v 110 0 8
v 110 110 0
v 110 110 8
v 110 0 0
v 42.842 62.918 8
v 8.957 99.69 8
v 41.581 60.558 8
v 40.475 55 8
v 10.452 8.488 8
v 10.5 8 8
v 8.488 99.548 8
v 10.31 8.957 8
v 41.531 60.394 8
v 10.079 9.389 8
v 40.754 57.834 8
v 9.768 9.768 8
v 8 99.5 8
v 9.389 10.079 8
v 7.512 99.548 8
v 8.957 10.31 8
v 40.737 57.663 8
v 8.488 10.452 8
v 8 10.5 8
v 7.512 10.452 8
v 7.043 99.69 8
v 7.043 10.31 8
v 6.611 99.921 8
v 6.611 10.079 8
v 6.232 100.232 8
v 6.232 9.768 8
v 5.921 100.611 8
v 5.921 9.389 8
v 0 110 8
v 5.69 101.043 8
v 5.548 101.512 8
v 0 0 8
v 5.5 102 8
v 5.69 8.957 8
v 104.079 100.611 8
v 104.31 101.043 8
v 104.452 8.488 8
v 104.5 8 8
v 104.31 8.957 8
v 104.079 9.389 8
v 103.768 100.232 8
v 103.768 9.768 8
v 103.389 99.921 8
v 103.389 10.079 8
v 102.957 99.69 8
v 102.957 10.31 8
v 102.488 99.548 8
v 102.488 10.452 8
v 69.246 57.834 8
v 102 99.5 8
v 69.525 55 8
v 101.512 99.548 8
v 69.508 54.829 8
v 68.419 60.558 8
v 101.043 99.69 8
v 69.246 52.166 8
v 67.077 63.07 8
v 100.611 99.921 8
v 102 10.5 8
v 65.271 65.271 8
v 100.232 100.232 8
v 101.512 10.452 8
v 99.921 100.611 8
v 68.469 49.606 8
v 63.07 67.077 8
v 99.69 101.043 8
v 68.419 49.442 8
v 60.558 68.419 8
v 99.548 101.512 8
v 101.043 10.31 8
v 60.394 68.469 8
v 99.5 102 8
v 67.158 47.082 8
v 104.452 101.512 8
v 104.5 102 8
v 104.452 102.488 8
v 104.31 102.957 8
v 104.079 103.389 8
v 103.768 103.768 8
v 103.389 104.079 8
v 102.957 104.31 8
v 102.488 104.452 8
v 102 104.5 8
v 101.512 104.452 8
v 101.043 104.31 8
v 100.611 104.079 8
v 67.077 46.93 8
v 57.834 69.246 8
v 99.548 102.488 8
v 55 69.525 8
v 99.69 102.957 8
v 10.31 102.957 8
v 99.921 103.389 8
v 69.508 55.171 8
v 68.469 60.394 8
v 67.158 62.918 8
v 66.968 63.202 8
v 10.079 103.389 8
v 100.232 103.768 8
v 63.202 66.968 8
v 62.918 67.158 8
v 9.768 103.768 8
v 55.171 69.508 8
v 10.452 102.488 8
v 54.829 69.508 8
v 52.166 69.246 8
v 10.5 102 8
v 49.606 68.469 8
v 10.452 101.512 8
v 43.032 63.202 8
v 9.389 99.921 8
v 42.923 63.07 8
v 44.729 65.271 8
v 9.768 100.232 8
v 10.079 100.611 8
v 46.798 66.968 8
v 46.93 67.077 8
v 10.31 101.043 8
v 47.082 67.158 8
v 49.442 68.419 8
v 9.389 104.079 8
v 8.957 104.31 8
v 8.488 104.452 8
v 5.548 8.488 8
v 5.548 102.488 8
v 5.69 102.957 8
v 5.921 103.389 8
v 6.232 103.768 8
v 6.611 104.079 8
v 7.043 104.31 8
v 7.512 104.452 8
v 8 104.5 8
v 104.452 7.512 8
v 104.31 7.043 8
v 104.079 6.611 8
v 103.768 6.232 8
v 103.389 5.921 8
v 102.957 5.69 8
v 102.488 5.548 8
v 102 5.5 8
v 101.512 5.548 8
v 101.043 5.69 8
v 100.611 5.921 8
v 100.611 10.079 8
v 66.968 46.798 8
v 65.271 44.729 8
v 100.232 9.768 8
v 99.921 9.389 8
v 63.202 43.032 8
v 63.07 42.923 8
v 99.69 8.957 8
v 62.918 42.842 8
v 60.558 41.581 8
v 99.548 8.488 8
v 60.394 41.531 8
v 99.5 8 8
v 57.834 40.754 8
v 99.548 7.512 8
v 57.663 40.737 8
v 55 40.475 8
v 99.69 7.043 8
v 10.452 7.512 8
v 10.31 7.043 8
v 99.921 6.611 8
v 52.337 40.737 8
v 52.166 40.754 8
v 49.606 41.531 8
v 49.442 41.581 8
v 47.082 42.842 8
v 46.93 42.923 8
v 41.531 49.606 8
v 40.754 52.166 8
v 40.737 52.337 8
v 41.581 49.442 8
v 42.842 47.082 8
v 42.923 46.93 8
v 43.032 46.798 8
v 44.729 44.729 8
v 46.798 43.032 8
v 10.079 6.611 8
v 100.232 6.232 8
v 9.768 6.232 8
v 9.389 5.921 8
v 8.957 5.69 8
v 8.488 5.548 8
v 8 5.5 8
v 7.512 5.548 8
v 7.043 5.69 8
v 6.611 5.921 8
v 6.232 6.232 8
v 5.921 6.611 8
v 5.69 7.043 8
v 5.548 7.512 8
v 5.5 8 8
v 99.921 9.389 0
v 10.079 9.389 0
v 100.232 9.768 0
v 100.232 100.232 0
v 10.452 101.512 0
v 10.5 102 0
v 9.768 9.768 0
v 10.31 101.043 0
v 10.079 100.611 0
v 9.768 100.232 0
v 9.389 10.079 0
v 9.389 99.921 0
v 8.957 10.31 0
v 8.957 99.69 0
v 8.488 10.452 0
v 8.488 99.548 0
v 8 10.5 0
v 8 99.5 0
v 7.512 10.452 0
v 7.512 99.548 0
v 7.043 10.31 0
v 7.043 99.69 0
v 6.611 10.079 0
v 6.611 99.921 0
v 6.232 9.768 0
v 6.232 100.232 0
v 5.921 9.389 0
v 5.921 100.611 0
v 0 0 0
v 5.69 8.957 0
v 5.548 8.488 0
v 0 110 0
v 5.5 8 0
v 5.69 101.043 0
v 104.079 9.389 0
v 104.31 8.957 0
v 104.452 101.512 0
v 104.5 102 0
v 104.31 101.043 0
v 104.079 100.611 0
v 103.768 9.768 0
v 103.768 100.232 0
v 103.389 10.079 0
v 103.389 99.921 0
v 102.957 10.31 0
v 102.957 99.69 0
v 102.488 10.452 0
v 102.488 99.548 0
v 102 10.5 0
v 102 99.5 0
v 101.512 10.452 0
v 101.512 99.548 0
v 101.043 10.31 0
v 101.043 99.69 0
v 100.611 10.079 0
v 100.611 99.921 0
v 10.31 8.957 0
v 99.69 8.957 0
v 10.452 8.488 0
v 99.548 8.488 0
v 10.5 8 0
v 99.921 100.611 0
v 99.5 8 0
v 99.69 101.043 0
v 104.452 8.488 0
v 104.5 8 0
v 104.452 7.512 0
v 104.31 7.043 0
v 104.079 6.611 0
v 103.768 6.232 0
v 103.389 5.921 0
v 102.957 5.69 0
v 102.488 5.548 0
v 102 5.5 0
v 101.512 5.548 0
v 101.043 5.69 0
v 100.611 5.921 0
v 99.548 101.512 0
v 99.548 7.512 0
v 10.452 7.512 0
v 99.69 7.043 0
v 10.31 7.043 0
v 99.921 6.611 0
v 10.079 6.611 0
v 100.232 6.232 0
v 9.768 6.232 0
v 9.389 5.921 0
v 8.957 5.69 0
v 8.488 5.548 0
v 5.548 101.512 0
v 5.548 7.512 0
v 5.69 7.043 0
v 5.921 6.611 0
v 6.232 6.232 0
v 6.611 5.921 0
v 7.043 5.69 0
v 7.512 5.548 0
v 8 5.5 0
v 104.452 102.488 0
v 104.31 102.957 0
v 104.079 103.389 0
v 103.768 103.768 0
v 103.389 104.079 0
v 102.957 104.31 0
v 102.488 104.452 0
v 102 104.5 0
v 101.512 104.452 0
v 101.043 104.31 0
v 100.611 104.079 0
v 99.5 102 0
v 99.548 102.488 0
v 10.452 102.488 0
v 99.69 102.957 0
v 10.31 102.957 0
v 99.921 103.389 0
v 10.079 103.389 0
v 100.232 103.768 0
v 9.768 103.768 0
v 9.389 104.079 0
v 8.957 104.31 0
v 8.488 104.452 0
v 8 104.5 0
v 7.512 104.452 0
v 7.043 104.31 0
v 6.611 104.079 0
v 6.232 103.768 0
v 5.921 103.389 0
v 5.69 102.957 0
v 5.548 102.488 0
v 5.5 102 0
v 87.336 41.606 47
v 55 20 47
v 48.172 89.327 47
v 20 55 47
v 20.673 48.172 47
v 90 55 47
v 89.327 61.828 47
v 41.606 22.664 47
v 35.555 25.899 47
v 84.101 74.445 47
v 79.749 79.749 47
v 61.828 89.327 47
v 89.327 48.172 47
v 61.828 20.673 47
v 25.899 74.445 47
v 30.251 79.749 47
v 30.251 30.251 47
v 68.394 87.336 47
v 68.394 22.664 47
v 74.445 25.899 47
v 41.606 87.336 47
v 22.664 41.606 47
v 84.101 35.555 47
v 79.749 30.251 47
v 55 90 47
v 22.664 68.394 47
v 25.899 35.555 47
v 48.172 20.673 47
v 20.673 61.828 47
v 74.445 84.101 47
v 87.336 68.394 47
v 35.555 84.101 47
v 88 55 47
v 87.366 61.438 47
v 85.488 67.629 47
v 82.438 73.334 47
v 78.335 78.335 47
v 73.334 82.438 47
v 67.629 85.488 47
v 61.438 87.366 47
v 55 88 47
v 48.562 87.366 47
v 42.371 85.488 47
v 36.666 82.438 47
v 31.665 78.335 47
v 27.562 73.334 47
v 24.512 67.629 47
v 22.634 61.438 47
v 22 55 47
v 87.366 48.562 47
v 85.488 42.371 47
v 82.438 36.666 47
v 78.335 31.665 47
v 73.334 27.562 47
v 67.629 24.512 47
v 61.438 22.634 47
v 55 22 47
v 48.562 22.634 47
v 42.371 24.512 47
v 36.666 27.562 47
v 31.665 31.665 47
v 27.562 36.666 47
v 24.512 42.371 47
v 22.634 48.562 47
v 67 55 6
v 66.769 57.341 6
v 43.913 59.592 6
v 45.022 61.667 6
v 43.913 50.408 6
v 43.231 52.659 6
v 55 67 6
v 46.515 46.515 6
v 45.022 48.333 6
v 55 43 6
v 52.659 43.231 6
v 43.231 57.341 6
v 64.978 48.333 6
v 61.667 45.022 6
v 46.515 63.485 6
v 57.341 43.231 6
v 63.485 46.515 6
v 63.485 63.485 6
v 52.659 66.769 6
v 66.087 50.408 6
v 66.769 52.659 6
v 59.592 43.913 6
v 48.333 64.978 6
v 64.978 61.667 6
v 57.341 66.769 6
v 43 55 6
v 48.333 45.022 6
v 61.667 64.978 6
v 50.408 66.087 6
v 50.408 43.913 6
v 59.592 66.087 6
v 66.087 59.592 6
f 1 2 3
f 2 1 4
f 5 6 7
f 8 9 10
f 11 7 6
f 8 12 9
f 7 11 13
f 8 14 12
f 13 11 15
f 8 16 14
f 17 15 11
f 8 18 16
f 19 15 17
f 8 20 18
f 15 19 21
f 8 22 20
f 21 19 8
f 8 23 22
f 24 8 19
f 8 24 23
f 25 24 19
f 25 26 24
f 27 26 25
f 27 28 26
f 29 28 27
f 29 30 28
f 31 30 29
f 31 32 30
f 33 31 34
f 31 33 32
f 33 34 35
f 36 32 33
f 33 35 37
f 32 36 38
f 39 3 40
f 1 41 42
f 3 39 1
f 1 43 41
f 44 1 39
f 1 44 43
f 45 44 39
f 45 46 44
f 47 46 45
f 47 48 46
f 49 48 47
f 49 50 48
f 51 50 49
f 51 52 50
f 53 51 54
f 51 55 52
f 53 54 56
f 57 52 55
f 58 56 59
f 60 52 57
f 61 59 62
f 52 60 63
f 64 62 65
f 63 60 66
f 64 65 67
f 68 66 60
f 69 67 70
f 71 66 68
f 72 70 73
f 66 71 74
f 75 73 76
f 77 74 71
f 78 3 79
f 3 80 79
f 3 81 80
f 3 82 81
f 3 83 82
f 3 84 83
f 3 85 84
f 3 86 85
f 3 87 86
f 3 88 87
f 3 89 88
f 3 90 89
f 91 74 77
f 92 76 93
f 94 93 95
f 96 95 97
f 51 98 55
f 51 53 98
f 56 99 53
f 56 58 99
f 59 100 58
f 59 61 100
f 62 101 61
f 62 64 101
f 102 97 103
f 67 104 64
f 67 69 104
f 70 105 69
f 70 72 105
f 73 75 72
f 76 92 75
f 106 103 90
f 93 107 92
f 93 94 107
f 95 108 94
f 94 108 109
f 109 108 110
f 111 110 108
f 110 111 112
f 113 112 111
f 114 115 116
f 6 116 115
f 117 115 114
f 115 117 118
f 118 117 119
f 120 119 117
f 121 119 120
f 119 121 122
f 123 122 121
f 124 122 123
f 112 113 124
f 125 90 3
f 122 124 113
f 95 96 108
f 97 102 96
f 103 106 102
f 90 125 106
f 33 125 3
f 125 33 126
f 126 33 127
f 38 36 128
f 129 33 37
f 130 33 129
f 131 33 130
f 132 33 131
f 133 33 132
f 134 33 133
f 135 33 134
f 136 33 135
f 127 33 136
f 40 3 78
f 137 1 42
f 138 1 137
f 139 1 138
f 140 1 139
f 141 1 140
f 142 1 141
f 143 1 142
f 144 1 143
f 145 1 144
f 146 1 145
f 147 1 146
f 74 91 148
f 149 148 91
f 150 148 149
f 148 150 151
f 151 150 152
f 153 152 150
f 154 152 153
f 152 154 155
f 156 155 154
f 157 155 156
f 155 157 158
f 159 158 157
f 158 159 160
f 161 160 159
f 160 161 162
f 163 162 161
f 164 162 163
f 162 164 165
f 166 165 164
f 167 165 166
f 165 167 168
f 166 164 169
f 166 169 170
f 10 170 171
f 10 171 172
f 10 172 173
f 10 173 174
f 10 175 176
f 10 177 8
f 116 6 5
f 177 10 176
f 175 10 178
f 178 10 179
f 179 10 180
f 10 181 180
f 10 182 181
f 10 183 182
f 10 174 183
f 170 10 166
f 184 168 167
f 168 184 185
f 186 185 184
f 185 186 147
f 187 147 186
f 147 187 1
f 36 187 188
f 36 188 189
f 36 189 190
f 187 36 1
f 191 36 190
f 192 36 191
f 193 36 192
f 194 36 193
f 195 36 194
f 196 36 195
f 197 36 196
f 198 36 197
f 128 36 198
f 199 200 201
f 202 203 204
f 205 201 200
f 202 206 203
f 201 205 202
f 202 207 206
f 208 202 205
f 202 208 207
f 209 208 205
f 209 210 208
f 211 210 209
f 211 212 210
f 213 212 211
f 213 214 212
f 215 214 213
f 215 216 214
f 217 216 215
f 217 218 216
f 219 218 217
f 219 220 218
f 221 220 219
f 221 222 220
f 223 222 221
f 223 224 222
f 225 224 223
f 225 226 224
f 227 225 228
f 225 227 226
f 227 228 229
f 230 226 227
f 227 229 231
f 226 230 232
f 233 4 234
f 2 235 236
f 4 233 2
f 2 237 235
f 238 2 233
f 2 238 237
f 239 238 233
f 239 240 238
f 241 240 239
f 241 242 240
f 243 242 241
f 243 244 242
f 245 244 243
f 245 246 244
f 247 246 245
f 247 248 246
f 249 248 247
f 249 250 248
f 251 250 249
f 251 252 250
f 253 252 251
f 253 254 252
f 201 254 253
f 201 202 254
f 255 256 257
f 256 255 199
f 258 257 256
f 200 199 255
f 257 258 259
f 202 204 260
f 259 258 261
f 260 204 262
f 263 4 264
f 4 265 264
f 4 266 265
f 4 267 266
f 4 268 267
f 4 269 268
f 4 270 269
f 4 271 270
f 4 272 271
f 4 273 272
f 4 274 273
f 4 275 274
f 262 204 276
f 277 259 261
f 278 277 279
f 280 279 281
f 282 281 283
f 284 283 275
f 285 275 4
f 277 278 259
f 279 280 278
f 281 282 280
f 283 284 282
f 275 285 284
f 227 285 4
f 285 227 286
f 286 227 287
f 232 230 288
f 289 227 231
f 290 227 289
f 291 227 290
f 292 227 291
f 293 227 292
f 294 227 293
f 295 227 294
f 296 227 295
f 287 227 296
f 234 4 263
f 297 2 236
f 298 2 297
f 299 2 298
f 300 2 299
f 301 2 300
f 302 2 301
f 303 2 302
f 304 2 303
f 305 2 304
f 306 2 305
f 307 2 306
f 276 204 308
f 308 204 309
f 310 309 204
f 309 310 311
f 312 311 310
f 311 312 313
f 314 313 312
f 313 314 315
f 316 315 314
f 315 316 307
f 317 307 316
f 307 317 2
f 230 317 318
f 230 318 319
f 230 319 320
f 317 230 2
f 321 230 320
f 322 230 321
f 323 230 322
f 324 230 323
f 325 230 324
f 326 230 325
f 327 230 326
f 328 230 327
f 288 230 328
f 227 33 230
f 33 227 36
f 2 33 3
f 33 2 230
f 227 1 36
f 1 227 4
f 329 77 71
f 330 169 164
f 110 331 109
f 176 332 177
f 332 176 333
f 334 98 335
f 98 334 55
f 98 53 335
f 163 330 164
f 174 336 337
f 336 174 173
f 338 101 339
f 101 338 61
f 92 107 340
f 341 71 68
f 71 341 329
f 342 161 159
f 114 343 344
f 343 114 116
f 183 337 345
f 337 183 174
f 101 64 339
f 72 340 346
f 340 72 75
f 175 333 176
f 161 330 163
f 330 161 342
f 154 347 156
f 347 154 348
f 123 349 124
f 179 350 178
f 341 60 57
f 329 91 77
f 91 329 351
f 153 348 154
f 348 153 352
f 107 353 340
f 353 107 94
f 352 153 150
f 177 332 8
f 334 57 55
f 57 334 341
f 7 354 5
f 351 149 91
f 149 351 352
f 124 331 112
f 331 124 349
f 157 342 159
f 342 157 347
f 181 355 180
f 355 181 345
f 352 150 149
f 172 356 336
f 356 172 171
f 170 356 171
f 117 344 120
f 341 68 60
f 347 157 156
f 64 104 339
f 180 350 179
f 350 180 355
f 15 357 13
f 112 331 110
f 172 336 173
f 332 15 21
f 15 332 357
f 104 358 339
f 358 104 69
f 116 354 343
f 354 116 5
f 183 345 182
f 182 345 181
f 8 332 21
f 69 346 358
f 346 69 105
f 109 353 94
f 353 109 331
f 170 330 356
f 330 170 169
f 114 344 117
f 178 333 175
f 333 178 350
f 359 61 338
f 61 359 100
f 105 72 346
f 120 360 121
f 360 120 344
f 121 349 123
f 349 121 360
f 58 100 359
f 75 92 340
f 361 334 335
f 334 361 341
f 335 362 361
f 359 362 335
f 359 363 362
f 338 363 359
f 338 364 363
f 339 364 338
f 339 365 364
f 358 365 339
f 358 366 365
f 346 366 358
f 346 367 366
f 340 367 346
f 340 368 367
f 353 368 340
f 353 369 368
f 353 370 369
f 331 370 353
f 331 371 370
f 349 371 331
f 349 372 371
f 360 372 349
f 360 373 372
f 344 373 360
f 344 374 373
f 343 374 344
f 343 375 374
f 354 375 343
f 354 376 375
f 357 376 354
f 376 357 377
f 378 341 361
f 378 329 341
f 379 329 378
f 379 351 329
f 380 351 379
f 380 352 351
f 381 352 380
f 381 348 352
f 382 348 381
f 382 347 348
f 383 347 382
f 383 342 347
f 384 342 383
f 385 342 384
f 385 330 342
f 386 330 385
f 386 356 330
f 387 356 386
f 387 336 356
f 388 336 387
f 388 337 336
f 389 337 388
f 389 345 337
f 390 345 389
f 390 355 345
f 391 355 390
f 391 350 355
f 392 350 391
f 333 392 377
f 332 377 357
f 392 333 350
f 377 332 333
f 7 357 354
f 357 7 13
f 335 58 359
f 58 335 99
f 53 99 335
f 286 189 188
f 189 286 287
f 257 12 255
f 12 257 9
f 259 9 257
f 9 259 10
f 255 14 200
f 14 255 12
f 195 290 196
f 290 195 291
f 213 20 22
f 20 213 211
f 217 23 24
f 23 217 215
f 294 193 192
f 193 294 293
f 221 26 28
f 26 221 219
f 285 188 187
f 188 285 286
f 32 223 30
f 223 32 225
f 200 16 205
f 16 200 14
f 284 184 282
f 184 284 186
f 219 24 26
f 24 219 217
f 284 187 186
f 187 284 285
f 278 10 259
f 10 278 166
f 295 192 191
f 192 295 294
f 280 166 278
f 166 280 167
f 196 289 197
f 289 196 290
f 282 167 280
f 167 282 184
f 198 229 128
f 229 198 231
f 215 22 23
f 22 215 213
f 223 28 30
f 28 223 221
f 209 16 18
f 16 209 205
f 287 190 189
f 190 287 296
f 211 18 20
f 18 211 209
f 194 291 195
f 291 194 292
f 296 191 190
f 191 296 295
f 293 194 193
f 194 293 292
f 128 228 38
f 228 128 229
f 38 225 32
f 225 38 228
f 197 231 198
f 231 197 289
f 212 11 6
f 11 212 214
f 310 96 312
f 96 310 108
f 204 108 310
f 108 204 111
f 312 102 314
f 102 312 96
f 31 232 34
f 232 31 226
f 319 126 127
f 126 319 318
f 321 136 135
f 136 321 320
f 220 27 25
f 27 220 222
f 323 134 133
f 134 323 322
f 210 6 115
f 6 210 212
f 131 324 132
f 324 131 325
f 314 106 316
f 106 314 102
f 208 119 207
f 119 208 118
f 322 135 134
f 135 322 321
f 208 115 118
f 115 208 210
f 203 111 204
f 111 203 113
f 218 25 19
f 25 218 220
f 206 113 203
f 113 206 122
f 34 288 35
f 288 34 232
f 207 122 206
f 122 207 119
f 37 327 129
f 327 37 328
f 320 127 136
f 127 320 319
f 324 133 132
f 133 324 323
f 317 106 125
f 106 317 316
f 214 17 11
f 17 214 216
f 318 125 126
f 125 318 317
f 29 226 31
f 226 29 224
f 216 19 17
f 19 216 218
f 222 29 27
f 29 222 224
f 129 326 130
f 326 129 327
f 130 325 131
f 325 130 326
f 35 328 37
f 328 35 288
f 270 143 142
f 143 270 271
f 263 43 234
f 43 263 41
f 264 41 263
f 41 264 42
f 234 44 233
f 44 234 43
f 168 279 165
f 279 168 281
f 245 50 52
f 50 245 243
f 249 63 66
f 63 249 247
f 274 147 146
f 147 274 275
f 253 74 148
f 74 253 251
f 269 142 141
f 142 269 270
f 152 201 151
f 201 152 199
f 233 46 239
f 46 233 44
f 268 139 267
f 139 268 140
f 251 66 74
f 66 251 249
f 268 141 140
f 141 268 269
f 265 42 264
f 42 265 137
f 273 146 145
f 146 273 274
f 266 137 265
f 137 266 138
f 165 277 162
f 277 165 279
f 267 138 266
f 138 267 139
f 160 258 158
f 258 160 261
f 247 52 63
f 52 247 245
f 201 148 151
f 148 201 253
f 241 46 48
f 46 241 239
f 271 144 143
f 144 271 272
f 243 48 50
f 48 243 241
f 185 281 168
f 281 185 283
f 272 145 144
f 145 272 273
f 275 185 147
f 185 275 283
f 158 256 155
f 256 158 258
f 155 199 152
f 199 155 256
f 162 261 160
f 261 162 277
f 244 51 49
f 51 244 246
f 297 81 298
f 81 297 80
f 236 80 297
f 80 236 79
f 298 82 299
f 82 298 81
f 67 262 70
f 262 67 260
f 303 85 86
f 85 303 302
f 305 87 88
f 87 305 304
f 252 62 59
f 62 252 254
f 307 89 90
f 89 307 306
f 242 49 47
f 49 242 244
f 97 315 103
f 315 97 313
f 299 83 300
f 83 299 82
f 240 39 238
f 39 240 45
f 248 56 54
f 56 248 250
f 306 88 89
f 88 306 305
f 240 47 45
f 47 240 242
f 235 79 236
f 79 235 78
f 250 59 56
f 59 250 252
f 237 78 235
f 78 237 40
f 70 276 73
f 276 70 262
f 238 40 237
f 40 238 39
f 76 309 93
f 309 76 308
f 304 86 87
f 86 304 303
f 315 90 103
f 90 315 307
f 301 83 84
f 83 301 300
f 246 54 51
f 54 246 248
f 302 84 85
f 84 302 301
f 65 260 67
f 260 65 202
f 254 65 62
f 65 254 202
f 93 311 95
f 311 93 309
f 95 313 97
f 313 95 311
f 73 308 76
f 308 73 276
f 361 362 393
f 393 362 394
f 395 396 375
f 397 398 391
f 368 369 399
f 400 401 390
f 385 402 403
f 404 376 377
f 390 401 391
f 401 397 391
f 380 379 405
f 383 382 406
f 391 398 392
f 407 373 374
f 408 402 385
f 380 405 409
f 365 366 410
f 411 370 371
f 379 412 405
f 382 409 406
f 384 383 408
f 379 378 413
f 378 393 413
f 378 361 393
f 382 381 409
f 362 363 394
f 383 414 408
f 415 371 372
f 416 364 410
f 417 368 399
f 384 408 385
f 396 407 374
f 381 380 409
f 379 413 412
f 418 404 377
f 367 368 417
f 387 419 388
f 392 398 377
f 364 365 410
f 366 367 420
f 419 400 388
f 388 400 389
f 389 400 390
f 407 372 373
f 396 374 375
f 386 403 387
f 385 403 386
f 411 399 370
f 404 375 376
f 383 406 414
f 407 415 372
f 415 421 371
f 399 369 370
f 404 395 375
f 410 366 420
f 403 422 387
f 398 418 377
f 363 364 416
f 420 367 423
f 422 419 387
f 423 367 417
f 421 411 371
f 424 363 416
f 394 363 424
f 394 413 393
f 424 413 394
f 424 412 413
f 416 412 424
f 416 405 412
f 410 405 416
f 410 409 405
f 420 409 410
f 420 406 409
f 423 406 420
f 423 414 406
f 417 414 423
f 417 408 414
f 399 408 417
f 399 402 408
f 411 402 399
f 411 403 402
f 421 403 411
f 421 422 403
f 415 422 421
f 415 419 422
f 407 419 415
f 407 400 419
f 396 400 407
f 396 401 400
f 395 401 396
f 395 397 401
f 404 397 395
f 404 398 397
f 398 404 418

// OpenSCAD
$fn = 32;

// ----------------------------------------------------------------------
// Hopper: flanged with square flange
// ----------------------------------------------------------------------

// --- parameters (mm) ---
fl = 110;                 // flange side, X and Y
fl_t = 8;                 // flange thickness
cone_h = 40;              // cone height above the flange
top_d = 70;               // cone mouth diameter
bot_d = 28;               // cone spout diameter
wall = 2;                 // cone wall thickness
hole_r = 2.5;             // flange hole radius
hole_in = 8;              // hole inset from the corners

bore_d = bot_d - 2 * wall;  // spout bore diameter
total_h = fl_t + cone_h - 1;  // overall height

difference() {
  union() {
    cube([fl, fl, fl_t]);
    translate([fl / 2, fl / 2, fl_t - 1])
      cylinder(h = cone_h, d1 = bot_d, d2 = top_d);
  }
  translate([fl / 2, fl / 2, fl_t - 2])
    cylinder(h = cone_h + 1, d1 = bore_d, d2 = top_d - 2 * wall);
  for (sx = [0, 1], sy = [0, 1])
    translate([sx ? fl - hole_in : hole_in,
               sy ? fl - hole_in : hole_in, -1])
      cylinder(r = hole_r, h = fl_t + 2);
}
